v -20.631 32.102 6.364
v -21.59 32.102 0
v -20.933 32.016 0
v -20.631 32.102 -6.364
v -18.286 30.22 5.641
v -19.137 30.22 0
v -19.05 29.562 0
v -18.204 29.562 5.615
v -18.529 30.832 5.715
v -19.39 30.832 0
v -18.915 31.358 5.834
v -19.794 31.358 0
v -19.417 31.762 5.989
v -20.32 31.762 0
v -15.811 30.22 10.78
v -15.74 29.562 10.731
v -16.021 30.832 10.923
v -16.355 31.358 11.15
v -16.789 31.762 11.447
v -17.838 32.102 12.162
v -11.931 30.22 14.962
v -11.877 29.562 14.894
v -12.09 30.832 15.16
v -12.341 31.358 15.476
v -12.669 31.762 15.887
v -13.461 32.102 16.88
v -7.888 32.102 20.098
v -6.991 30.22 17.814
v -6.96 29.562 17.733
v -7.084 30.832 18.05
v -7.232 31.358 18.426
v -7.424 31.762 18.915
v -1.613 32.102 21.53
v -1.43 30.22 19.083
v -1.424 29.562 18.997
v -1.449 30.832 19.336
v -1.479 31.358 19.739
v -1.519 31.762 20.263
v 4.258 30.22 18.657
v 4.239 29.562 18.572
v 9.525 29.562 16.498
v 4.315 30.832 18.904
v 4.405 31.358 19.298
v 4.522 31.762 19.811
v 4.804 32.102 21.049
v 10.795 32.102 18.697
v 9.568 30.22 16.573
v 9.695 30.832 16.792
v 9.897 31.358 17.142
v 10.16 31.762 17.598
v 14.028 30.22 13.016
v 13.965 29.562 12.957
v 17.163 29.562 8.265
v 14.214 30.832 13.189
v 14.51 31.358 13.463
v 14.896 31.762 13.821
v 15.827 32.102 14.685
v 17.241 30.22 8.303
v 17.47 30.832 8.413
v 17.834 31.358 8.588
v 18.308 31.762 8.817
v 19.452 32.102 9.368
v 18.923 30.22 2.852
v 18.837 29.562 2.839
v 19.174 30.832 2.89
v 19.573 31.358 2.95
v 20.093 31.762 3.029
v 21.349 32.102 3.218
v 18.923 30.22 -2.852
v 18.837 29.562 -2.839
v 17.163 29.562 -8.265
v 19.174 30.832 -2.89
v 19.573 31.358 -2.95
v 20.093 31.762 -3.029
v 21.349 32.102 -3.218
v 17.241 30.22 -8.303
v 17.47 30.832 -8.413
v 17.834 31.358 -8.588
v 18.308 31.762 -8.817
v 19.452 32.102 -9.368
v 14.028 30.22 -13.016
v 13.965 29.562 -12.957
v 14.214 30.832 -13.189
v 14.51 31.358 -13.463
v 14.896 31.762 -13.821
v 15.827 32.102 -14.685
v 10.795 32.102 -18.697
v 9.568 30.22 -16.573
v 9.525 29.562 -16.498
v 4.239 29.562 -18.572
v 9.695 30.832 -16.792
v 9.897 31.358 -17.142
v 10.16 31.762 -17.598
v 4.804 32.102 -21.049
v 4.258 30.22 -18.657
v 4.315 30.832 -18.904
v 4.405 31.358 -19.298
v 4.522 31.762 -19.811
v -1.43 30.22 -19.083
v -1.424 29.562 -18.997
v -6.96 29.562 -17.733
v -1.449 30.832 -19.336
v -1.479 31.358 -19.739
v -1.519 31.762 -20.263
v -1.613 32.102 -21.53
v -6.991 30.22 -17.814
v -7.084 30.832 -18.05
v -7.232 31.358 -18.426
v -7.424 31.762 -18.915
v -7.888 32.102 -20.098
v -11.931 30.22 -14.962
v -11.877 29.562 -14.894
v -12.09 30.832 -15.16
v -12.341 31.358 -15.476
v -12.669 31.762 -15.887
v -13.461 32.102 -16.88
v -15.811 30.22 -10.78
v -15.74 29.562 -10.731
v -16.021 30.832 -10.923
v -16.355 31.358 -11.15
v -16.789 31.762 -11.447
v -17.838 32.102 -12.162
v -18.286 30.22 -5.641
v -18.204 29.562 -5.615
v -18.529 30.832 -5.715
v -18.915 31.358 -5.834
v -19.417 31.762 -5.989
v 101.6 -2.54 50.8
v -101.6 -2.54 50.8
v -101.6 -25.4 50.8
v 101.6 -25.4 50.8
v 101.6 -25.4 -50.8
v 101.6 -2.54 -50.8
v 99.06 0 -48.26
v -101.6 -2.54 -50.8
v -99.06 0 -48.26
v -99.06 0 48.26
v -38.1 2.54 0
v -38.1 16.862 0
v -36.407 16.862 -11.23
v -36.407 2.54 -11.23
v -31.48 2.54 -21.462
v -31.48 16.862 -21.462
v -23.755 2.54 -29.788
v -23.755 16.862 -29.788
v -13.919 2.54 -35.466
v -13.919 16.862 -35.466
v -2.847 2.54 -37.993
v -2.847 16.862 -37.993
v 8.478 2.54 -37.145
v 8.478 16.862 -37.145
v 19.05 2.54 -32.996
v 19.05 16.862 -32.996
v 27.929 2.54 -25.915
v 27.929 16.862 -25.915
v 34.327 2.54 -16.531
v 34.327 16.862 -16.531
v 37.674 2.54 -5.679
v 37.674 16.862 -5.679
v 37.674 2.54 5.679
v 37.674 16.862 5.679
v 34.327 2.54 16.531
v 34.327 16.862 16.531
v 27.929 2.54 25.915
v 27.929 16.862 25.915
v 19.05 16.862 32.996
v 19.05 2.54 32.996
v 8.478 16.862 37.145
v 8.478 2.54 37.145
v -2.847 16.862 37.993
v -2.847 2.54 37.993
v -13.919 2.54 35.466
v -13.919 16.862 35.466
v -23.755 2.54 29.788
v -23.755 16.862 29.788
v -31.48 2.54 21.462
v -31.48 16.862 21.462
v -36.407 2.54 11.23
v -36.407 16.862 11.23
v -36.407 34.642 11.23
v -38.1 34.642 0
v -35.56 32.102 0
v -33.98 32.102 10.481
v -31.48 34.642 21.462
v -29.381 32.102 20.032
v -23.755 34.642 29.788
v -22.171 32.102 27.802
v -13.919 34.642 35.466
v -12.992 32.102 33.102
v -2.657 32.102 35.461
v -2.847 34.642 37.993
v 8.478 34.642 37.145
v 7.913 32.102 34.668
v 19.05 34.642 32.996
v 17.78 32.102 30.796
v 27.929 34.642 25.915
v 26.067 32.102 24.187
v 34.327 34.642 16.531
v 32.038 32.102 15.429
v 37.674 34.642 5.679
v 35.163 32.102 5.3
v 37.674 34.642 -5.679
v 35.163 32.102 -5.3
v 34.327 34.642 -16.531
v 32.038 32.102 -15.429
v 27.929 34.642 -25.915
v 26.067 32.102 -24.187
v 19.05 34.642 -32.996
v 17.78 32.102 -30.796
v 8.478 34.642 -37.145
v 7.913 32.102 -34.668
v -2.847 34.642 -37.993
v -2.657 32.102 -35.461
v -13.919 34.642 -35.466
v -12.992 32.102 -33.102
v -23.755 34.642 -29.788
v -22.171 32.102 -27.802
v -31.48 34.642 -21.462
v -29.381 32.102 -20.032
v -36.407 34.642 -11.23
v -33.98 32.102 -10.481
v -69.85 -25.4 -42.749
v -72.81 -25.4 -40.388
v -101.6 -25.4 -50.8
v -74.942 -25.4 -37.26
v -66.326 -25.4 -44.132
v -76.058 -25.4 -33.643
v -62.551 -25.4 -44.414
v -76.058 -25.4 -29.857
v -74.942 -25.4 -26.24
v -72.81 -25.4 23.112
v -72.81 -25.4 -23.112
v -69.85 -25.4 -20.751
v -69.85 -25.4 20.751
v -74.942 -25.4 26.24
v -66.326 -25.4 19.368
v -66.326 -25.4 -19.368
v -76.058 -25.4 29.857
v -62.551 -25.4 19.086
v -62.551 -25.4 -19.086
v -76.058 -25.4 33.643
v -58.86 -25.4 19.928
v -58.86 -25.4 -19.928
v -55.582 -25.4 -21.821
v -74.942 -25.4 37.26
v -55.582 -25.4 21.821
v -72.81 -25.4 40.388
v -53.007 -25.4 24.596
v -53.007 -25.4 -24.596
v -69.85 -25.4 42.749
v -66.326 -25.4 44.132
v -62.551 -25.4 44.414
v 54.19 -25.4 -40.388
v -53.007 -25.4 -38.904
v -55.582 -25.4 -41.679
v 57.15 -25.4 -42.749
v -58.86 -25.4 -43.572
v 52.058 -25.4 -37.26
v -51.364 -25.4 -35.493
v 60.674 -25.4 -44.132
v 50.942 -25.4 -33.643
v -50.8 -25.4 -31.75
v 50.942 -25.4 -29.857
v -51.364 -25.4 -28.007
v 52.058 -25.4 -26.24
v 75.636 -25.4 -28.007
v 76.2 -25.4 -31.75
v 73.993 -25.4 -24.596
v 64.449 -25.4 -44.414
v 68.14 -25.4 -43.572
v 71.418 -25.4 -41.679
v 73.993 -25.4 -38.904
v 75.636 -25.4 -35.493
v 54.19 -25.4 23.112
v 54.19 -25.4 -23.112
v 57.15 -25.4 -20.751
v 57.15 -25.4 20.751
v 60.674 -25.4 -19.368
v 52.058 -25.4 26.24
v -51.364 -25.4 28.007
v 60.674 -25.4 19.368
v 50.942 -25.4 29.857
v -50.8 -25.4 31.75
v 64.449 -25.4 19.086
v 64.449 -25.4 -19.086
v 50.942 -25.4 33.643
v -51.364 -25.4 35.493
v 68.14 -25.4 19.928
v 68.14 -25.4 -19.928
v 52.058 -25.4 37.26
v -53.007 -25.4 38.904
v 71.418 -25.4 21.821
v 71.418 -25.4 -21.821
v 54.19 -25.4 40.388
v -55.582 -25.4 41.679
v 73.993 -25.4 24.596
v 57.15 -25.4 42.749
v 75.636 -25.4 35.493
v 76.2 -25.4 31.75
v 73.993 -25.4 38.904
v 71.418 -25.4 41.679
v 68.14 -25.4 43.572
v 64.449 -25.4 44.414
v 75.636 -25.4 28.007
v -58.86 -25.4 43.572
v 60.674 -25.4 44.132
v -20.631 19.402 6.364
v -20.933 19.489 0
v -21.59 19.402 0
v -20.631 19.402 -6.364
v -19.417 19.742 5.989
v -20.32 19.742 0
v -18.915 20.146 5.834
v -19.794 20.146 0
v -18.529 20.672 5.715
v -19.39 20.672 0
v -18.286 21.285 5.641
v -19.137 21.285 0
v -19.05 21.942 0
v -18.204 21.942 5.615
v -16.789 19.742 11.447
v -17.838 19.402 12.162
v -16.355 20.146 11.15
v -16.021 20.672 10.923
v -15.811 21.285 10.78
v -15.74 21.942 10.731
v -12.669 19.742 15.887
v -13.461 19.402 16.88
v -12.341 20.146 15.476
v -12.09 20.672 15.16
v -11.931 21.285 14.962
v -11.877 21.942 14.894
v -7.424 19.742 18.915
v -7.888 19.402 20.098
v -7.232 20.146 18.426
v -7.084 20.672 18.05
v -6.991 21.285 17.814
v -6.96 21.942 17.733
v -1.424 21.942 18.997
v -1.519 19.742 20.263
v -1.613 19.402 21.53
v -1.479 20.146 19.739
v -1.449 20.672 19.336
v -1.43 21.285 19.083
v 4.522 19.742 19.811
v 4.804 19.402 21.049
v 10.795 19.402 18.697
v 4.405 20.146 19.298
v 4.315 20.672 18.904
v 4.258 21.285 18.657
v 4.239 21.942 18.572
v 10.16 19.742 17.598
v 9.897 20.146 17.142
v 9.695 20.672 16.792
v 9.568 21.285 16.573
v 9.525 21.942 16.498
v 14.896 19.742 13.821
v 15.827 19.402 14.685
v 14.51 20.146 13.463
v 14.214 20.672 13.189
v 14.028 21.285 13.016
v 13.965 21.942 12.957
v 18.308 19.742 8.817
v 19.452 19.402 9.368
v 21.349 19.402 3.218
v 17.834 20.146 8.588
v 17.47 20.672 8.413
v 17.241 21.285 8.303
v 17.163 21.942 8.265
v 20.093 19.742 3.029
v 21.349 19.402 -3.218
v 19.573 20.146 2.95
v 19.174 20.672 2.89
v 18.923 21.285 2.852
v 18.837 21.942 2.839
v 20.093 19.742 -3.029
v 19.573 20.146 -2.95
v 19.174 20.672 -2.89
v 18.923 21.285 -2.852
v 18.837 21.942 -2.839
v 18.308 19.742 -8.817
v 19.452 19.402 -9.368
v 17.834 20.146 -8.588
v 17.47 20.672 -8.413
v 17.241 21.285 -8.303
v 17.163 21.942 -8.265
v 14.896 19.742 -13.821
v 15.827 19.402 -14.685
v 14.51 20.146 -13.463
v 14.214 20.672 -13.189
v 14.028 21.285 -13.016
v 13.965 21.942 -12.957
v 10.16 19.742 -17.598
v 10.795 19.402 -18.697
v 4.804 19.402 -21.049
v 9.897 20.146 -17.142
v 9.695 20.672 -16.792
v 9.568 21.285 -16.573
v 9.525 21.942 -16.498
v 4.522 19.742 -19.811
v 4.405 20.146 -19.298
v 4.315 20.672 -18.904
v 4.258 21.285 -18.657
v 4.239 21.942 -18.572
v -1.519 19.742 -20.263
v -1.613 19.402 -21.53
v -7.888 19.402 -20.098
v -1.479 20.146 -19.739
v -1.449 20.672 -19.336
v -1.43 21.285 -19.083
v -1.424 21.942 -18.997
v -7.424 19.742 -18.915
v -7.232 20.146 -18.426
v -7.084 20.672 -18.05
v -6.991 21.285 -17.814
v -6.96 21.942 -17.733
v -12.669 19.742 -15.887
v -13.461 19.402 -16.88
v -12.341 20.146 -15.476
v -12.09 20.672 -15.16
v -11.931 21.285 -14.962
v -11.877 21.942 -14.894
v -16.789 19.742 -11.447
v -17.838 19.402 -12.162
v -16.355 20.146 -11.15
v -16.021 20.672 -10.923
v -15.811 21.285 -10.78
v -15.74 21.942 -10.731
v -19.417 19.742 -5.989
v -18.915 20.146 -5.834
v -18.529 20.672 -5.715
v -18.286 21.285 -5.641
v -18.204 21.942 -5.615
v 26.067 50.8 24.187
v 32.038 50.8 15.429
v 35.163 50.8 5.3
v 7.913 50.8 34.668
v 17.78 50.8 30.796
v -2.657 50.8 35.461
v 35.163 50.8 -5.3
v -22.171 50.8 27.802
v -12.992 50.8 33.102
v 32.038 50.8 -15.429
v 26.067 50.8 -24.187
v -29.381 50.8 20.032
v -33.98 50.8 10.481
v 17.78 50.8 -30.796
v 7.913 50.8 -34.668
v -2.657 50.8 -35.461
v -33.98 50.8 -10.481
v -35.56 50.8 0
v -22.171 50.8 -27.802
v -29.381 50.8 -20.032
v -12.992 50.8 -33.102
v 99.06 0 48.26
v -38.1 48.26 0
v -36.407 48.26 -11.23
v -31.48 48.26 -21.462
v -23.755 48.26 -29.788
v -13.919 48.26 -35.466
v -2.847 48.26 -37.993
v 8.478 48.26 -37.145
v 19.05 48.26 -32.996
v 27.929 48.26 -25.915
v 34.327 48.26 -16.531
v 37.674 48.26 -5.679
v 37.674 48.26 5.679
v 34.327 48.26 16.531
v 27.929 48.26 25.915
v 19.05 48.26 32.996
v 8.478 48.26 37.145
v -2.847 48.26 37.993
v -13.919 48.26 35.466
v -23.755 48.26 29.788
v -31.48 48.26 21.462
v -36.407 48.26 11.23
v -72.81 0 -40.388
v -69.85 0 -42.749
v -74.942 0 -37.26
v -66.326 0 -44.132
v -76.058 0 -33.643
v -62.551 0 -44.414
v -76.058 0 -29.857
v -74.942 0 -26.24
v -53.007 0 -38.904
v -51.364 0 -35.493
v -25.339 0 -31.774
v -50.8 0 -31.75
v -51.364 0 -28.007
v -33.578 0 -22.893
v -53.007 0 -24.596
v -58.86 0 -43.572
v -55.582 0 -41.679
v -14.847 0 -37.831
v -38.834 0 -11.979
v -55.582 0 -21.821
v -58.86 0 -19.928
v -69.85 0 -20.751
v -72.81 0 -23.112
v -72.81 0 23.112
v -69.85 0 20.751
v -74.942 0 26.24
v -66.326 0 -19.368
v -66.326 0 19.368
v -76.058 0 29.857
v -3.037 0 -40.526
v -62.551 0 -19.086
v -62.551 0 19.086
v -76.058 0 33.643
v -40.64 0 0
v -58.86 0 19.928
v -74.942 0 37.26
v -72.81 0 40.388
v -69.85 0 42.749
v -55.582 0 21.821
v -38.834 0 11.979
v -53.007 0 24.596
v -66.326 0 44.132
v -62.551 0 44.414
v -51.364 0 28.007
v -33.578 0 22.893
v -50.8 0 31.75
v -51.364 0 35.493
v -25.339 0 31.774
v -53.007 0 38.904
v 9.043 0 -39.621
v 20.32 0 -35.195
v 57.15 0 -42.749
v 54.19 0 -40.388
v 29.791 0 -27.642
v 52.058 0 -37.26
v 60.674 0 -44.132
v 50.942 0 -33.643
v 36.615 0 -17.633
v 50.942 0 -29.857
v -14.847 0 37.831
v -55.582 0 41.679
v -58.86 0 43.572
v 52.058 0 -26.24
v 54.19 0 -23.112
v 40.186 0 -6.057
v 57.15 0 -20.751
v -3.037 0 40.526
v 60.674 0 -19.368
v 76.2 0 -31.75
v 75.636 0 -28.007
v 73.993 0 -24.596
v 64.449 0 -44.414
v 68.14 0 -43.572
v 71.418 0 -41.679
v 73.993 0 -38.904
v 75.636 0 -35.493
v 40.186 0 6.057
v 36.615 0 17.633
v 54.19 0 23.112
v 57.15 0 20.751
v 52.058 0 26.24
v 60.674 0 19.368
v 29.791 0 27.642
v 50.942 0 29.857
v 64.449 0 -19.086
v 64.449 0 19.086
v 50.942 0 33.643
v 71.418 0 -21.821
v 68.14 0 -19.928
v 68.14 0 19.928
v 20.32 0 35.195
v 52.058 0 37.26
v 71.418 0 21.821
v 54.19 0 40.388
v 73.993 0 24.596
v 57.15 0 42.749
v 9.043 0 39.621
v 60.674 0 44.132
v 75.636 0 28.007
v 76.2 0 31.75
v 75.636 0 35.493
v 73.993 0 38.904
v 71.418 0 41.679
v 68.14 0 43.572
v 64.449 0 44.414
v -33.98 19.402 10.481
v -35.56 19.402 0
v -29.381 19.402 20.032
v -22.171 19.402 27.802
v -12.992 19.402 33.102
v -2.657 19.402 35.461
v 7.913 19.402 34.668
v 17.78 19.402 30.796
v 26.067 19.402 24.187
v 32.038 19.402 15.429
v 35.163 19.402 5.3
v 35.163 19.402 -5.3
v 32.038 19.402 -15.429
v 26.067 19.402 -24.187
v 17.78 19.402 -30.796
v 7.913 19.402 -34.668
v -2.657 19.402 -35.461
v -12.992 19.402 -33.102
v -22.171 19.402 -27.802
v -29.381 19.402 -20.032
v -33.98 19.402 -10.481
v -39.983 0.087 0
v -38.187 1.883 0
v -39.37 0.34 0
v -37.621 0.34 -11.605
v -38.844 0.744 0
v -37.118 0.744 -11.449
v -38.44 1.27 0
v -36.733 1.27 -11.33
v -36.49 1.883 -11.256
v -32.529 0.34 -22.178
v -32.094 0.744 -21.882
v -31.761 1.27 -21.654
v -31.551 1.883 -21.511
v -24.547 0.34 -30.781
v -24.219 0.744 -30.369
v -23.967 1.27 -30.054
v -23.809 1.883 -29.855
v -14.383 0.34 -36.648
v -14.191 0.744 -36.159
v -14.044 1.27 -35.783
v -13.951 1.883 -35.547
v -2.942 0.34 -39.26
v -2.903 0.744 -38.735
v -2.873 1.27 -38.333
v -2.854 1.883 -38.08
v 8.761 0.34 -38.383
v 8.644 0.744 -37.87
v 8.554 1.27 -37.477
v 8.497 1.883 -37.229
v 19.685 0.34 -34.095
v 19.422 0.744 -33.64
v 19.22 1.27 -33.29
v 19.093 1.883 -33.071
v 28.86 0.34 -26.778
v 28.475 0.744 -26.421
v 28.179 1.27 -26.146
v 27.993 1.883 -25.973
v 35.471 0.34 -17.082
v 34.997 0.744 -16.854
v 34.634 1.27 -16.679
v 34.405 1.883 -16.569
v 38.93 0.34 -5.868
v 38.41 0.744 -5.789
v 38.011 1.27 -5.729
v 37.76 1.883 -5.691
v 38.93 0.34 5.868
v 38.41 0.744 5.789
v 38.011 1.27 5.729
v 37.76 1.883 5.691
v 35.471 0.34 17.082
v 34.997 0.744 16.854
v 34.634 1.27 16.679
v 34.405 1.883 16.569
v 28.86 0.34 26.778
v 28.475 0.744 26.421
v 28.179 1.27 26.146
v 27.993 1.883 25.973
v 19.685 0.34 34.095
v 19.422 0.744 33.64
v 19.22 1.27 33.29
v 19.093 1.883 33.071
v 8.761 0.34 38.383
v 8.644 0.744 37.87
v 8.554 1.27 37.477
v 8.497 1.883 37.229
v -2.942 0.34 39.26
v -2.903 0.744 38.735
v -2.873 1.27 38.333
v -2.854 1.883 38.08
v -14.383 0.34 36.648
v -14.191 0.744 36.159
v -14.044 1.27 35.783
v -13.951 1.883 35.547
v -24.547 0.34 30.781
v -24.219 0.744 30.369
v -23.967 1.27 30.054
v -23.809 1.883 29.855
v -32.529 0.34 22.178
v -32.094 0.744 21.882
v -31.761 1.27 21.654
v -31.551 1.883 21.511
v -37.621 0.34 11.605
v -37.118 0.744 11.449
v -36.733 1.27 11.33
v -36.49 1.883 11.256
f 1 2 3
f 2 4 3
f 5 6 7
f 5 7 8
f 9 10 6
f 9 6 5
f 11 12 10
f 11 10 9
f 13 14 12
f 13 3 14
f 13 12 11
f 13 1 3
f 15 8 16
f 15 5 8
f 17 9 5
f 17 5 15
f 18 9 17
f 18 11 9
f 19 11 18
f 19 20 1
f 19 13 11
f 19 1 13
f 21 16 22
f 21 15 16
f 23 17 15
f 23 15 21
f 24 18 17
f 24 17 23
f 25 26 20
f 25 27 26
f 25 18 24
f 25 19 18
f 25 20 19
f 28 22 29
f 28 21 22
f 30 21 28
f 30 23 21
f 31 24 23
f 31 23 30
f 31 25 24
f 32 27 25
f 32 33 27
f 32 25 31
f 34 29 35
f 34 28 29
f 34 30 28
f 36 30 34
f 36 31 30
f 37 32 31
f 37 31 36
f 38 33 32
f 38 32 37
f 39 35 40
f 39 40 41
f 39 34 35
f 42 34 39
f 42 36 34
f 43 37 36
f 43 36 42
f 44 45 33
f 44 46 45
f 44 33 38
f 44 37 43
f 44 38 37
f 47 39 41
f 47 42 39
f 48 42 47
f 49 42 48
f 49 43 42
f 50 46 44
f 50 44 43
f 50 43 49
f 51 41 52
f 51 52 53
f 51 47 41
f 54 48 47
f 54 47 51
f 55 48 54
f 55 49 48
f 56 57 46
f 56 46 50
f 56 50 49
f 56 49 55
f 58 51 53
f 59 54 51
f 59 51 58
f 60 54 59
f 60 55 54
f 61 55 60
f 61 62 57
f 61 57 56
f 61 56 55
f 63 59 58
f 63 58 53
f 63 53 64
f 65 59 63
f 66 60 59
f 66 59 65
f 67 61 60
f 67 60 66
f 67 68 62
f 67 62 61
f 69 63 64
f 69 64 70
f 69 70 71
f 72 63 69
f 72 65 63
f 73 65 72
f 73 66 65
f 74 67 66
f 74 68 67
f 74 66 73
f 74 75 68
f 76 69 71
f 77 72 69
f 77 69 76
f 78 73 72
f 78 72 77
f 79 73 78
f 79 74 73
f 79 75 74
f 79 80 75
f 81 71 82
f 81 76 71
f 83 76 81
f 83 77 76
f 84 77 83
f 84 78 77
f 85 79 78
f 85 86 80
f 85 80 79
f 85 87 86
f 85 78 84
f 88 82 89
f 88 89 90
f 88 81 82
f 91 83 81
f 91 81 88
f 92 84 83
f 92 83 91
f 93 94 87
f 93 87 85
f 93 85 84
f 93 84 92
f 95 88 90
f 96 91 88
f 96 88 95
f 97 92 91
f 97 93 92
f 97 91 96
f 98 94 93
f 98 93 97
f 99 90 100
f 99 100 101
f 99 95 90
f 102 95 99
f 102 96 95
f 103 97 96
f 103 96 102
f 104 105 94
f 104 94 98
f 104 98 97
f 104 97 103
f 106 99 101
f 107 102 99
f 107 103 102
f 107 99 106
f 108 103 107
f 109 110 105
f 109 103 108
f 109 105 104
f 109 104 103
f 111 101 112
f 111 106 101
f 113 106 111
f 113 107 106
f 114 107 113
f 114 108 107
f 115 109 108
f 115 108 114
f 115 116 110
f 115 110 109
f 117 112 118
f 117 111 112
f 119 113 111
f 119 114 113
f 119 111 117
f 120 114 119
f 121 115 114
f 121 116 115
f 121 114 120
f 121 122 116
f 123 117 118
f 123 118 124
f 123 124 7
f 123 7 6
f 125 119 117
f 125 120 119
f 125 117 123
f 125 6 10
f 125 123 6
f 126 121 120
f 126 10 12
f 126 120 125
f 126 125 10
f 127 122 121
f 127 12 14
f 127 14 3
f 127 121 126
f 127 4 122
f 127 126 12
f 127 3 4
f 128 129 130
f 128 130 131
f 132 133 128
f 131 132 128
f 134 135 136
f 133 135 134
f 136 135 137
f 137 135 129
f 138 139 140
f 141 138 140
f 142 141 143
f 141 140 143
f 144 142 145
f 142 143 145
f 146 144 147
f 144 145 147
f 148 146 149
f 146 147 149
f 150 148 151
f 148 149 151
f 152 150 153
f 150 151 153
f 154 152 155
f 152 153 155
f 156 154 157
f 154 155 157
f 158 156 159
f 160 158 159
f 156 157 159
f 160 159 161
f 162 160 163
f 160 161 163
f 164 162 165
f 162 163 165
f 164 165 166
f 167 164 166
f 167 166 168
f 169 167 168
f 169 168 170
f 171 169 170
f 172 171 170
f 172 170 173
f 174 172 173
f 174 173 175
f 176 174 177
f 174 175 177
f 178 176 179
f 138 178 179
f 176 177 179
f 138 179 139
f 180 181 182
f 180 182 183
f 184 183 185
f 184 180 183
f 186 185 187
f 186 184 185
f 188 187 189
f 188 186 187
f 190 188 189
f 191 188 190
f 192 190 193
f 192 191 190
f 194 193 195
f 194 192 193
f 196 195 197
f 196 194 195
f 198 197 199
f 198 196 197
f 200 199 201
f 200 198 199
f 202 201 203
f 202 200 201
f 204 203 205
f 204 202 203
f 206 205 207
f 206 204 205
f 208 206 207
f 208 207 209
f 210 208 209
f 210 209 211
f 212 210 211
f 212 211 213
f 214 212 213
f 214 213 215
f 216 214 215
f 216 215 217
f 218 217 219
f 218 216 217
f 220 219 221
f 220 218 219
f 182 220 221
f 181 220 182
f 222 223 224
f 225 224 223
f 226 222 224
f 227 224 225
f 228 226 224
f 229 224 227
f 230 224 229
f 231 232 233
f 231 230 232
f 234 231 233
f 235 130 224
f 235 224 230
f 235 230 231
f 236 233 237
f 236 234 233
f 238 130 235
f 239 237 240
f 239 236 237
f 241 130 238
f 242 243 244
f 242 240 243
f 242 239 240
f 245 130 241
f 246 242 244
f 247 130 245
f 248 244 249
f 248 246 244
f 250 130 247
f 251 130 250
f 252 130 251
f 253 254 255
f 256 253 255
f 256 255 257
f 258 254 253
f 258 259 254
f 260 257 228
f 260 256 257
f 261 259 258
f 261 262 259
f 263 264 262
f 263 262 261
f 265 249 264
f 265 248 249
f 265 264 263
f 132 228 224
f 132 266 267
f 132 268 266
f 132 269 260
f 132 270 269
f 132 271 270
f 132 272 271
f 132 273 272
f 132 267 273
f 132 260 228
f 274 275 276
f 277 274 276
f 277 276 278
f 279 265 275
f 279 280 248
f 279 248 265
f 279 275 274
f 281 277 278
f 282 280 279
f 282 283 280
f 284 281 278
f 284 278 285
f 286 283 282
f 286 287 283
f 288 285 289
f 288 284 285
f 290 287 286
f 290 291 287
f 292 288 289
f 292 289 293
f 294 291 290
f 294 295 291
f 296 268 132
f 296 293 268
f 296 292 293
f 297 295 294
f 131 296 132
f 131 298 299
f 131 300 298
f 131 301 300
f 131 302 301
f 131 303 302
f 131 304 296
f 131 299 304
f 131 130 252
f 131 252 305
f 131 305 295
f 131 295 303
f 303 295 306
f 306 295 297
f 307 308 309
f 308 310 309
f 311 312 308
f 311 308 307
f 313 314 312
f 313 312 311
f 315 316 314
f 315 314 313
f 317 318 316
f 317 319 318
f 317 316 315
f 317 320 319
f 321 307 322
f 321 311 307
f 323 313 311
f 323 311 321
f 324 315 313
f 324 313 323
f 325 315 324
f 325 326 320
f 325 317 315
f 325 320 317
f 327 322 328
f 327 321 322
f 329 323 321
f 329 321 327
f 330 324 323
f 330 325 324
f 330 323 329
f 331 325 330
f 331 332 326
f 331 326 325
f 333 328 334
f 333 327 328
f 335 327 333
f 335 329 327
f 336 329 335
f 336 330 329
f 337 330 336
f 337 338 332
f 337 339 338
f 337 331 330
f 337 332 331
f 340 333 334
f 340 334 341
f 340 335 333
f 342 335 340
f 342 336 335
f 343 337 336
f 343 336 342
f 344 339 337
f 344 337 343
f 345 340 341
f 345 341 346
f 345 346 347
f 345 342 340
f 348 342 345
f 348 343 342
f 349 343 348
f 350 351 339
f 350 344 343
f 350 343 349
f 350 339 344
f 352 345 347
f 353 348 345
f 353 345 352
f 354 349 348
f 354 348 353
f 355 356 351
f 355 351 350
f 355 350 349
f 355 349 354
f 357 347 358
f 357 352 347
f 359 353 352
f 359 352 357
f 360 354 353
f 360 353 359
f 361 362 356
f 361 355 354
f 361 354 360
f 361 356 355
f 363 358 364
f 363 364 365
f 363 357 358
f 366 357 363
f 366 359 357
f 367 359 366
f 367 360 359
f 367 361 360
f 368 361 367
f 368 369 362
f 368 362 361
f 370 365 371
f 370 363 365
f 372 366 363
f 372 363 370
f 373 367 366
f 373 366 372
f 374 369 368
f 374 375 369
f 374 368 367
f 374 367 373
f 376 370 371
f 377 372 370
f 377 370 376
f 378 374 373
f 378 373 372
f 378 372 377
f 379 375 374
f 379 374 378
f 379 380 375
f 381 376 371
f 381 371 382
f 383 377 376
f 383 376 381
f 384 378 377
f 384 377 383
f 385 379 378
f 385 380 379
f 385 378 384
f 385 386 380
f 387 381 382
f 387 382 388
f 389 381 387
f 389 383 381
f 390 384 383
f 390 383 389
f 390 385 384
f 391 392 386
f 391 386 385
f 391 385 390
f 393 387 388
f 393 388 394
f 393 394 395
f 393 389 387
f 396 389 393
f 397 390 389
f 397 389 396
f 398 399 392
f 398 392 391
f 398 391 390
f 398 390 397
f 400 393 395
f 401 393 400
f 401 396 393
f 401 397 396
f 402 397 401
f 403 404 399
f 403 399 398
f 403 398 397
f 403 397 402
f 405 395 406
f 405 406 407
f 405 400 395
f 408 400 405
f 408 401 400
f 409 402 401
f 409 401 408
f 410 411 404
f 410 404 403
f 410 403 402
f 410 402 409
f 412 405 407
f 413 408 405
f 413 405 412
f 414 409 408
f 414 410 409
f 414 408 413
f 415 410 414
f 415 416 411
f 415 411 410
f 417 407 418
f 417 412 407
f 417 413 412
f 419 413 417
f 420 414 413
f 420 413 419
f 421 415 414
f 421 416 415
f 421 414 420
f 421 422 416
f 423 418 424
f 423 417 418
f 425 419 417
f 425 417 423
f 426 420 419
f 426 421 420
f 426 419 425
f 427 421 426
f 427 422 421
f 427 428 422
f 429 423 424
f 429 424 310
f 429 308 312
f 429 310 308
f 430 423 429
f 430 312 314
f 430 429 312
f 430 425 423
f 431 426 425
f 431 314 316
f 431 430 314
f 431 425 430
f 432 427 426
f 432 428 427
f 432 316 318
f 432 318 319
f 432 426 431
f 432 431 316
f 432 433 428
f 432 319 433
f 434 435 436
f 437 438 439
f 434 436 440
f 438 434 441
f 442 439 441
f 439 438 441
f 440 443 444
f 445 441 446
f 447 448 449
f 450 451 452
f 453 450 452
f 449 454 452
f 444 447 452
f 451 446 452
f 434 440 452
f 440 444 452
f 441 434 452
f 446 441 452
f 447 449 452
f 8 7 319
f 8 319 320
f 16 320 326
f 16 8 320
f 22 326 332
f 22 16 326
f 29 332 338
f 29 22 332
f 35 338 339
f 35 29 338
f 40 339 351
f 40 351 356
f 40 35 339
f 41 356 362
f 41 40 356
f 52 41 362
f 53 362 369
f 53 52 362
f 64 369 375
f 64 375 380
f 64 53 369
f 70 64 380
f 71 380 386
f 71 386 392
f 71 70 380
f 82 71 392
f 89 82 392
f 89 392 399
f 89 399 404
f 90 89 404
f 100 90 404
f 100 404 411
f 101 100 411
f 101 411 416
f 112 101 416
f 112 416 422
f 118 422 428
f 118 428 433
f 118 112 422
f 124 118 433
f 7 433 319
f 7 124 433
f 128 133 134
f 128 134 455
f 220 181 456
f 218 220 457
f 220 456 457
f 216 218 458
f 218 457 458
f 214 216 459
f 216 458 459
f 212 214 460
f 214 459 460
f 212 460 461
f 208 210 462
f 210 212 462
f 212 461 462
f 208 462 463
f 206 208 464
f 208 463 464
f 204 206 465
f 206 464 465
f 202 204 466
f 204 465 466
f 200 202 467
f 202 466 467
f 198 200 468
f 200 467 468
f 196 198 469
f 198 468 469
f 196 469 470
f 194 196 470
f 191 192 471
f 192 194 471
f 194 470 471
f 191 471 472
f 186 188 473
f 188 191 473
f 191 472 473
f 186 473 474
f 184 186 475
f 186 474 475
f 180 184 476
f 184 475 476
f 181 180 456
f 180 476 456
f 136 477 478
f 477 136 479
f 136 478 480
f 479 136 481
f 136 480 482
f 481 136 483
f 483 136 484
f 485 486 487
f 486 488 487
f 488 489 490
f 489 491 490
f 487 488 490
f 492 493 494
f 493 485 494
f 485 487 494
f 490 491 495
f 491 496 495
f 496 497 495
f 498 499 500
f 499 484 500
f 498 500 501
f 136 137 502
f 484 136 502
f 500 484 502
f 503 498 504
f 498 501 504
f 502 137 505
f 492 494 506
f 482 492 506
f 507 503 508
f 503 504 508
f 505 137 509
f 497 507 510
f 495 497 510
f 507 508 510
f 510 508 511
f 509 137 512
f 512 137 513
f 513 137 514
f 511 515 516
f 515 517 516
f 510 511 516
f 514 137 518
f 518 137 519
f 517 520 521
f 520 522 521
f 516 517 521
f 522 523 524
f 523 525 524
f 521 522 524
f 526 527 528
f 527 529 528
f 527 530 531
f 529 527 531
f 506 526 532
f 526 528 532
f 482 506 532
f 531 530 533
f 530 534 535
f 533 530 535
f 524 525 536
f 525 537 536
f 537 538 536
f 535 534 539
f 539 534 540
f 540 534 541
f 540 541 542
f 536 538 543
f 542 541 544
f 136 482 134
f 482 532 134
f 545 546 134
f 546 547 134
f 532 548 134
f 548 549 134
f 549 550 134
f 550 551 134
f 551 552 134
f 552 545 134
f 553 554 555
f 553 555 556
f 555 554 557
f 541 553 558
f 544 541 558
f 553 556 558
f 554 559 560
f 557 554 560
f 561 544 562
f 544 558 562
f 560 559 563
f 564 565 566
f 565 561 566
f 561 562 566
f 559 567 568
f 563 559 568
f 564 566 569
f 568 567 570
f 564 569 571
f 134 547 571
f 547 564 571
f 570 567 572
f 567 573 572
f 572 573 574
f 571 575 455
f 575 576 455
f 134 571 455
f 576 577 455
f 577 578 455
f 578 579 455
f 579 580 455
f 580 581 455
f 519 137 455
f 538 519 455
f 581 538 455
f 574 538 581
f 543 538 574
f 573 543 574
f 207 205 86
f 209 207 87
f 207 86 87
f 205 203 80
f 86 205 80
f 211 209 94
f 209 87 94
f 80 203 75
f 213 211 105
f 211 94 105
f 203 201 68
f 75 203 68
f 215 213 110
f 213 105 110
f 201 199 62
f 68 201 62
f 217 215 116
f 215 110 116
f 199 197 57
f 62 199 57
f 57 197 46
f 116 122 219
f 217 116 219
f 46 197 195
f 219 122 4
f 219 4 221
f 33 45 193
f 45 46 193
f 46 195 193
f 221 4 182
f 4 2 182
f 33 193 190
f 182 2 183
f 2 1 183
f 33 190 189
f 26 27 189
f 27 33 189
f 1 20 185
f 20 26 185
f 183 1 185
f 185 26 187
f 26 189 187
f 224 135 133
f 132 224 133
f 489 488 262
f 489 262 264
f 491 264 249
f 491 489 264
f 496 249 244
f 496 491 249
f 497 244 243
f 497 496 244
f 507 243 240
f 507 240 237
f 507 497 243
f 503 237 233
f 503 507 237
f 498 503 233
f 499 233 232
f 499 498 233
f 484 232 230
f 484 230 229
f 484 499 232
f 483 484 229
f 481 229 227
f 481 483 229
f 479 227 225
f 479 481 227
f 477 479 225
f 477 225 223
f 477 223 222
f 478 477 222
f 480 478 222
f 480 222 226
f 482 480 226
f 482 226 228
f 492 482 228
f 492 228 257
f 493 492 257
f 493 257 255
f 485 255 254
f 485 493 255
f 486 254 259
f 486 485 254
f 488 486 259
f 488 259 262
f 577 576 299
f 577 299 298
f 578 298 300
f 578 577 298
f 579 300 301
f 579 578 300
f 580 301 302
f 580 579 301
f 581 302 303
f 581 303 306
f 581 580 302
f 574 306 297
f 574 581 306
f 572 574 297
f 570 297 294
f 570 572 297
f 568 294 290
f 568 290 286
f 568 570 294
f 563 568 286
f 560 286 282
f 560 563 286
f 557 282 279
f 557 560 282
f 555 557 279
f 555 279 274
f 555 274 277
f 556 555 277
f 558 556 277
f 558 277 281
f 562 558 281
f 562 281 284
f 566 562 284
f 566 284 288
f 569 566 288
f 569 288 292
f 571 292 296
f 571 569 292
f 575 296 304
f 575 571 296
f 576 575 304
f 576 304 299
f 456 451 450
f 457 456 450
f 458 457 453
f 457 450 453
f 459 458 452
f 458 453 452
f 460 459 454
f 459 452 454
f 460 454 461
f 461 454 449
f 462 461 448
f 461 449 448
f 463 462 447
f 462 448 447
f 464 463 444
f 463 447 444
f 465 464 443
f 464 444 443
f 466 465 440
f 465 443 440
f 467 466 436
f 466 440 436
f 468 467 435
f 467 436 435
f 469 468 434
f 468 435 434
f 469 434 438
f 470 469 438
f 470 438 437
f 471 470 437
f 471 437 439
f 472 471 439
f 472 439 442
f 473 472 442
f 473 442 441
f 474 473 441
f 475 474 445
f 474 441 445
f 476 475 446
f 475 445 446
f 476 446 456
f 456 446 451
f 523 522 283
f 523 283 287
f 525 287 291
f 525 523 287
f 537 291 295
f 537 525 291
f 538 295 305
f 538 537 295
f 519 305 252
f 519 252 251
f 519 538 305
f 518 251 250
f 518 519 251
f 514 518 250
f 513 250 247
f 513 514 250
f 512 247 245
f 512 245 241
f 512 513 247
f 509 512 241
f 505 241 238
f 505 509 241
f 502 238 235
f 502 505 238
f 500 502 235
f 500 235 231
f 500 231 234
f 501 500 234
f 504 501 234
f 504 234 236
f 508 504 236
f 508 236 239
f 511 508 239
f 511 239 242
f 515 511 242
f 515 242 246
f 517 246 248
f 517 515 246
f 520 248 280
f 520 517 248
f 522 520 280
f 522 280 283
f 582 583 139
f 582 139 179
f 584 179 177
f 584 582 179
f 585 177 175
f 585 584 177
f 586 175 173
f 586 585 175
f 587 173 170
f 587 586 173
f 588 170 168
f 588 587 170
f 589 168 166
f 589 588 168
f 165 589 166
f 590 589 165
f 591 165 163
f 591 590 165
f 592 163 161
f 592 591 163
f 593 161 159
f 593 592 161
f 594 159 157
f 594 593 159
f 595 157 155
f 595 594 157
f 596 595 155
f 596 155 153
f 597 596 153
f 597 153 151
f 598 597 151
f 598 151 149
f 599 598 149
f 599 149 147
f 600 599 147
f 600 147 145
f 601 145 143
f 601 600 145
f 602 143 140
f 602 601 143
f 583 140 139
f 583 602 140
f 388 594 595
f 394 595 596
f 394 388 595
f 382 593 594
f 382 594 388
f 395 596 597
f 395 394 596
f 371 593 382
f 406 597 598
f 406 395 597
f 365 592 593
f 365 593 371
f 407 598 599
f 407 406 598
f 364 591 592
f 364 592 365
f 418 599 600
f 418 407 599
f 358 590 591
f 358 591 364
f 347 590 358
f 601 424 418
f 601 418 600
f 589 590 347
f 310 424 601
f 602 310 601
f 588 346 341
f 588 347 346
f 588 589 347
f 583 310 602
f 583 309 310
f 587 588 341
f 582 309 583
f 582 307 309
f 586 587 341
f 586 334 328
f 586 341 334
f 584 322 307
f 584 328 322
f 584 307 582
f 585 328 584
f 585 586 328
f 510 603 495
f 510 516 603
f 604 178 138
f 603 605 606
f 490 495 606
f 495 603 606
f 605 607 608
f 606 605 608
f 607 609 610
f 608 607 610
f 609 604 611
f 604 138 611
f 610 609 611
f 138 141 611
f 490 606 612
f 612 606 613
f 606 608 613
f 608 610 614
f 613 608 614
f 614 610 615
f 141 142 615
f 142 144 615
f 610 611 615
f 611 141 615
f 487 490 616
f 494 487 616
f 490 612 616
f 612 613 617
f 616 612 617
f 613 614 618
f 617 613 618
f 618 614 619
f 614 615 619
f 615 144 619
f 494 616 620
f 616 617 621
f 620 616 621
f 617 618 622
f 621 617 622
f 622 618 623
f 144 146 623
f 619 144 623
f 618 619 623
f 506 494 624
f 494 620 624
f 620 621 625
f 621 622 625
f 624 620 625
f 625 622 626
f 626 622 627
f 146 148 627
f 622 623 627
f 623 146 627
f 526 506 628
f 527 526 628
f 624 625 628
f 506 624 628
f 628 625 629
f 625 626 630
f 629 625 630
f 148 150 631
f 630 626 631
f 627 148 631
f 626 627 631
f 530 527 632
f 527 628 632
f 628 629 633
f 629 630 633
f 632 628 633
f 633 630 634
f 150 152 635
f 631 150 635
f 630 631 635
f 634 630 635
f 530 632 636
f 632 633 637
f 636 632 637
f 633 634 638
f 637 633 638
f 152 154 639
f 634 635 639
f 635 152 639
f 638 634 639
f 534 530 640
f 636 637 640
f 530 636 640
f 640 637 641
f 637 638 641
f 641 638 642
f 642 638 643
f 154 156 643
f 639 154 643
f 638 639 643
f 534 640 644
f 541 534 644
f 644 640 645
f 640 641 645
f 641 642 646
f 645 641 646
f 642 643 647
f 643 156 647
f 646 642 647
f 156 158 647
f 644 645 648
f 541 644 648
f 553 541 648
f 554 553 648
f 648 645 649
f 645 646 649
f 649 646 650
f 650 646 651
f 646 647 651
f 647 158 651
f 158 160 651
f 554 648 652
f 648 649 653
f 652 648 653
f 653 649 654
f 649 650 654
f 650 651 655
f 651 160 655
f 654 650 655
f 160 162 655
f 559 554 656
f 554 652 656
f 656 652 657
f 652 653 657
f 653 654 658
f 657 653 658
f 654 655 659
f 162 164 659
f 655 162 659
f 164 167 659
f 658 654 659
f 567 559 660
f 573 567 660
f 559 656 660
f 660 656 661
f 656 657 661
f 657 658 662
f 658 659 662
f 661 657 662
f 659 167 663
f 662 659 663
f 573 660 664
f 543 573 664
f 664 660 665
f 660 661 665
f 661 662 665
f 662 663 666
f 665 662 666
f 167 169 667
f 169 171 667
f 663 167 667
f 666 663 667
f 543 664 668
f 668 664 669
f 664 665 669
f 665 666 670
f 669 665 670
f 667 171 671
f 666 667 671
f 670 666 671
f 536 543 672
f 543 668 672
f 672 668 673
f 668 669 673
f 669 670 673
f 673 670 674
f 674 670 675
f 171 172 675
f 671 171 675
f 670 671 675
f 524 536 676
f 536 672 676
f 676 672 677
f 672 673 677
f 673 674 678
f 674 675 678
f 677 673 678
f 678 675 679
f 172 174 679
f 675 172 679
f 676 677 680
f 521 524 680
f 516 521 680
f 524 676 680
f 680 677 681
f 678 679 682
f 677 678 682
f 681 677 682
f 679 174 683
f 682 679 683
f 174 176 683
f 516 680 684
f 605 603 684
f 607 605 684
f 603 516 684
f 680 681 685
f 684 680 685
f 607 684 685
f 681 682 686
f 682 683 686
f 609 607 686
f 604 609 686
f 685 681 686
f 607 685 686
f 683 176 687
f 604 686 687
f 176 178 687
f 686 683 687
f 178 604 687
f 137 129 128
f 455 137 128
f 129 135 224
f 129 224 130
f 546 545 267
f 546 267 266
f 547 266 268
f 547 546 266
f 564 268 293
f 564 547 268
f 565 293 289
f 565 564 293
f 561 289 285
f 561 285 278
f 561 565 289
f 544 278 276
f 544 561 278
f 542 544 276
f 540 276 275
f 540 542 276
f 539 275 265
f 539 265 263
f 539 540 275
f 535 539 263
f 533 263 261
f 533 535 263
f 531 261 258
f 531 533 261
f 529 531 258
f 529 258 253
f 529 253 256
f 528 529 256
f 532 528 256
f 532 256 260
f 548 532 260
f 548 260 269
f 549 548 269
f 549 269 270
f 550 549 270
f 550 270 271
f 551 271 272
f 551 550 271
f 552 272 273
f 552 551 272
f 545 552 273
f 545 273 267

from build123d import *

# Parameters (mm, degrees)
F0_W     = 203.2
F0_H     = 101.6
F1_DEPTH = 25.4
F2_R     = 12.7
F3_DEPTH = 25.4
F4_W     = 38.1
F4_H     = 50.8
F6_W     = 25.4
F6_H     = 12.7
F8_R     = 2.54
F9_SIZE  = 2.54


with BuildPart() as f1:
    # F0 (on Front) → F1 (new body)
    with BuildSketch(Plane.XZ):
        Rectangle(F0_W, F0_H)
    extrude(amount=F1_DEPTH)

    # F2 (on Front) → F3 (cut)
    with BuildSketch(Plane.XZ):
        with Locations((-63.5, 31.75)):
            Circle(F2_R)
        with Locations((-63.5, -31.75)):
            Circle(F2_R)
        with Locations((63.5, 31.75)):
            Circle(F2_R)
        with Locations((63.5, -31.75)):
            Circle(F2_R)
    extrude(amount=F3_DEPTH, mode=Mode.SUBTRACT)

    # F4 (on Top) → F5 (revolve)
    with BuildSketch(Plane.XY):
        with Locations((-19.05, 25.4)):
            Rectangle(F4_W, F4_H)
    revolve(axis=Axis((0, 25.4, 0), (0, -1, 0)))

    # F6 (on Top) → F7 (revolve, cut)
    with BuildSketch(Plane.XY):
        with Locations((-31.75, 25.7521334298)):
            Rectangle(F6_W, F6_H)
    revolve(axis=Axis((0, 67.0673400164, 0), (0, 1, 0)), mode=Mode.SUBTRACT)

    # F8
    f8_edges = [f1.edges().sort_by_distance(p)[0] for p in [
        (38.1, 0, 0),
        (19.05, 19.402133, 0),
        (19.05, 32.102133, 0),
    ]]
    fillet(f8_edges, radius=F8_R)

    # F9
    f9_edges = [f1.edges().sort_by_distance(p)[0] for p in [
        (38.1, 50.8, 0),
        (38.1, 32.102133, 0),
        (38.1, 19.402133, 0),
        (-101.6, 0, 0),
        (0, 0, -50.8),
        (0, 0, 50.8),
        (101.6, 0, 0),
    ]]
    chamfer(f9_edges, length=F9_SIZE)


solid = f1.part
